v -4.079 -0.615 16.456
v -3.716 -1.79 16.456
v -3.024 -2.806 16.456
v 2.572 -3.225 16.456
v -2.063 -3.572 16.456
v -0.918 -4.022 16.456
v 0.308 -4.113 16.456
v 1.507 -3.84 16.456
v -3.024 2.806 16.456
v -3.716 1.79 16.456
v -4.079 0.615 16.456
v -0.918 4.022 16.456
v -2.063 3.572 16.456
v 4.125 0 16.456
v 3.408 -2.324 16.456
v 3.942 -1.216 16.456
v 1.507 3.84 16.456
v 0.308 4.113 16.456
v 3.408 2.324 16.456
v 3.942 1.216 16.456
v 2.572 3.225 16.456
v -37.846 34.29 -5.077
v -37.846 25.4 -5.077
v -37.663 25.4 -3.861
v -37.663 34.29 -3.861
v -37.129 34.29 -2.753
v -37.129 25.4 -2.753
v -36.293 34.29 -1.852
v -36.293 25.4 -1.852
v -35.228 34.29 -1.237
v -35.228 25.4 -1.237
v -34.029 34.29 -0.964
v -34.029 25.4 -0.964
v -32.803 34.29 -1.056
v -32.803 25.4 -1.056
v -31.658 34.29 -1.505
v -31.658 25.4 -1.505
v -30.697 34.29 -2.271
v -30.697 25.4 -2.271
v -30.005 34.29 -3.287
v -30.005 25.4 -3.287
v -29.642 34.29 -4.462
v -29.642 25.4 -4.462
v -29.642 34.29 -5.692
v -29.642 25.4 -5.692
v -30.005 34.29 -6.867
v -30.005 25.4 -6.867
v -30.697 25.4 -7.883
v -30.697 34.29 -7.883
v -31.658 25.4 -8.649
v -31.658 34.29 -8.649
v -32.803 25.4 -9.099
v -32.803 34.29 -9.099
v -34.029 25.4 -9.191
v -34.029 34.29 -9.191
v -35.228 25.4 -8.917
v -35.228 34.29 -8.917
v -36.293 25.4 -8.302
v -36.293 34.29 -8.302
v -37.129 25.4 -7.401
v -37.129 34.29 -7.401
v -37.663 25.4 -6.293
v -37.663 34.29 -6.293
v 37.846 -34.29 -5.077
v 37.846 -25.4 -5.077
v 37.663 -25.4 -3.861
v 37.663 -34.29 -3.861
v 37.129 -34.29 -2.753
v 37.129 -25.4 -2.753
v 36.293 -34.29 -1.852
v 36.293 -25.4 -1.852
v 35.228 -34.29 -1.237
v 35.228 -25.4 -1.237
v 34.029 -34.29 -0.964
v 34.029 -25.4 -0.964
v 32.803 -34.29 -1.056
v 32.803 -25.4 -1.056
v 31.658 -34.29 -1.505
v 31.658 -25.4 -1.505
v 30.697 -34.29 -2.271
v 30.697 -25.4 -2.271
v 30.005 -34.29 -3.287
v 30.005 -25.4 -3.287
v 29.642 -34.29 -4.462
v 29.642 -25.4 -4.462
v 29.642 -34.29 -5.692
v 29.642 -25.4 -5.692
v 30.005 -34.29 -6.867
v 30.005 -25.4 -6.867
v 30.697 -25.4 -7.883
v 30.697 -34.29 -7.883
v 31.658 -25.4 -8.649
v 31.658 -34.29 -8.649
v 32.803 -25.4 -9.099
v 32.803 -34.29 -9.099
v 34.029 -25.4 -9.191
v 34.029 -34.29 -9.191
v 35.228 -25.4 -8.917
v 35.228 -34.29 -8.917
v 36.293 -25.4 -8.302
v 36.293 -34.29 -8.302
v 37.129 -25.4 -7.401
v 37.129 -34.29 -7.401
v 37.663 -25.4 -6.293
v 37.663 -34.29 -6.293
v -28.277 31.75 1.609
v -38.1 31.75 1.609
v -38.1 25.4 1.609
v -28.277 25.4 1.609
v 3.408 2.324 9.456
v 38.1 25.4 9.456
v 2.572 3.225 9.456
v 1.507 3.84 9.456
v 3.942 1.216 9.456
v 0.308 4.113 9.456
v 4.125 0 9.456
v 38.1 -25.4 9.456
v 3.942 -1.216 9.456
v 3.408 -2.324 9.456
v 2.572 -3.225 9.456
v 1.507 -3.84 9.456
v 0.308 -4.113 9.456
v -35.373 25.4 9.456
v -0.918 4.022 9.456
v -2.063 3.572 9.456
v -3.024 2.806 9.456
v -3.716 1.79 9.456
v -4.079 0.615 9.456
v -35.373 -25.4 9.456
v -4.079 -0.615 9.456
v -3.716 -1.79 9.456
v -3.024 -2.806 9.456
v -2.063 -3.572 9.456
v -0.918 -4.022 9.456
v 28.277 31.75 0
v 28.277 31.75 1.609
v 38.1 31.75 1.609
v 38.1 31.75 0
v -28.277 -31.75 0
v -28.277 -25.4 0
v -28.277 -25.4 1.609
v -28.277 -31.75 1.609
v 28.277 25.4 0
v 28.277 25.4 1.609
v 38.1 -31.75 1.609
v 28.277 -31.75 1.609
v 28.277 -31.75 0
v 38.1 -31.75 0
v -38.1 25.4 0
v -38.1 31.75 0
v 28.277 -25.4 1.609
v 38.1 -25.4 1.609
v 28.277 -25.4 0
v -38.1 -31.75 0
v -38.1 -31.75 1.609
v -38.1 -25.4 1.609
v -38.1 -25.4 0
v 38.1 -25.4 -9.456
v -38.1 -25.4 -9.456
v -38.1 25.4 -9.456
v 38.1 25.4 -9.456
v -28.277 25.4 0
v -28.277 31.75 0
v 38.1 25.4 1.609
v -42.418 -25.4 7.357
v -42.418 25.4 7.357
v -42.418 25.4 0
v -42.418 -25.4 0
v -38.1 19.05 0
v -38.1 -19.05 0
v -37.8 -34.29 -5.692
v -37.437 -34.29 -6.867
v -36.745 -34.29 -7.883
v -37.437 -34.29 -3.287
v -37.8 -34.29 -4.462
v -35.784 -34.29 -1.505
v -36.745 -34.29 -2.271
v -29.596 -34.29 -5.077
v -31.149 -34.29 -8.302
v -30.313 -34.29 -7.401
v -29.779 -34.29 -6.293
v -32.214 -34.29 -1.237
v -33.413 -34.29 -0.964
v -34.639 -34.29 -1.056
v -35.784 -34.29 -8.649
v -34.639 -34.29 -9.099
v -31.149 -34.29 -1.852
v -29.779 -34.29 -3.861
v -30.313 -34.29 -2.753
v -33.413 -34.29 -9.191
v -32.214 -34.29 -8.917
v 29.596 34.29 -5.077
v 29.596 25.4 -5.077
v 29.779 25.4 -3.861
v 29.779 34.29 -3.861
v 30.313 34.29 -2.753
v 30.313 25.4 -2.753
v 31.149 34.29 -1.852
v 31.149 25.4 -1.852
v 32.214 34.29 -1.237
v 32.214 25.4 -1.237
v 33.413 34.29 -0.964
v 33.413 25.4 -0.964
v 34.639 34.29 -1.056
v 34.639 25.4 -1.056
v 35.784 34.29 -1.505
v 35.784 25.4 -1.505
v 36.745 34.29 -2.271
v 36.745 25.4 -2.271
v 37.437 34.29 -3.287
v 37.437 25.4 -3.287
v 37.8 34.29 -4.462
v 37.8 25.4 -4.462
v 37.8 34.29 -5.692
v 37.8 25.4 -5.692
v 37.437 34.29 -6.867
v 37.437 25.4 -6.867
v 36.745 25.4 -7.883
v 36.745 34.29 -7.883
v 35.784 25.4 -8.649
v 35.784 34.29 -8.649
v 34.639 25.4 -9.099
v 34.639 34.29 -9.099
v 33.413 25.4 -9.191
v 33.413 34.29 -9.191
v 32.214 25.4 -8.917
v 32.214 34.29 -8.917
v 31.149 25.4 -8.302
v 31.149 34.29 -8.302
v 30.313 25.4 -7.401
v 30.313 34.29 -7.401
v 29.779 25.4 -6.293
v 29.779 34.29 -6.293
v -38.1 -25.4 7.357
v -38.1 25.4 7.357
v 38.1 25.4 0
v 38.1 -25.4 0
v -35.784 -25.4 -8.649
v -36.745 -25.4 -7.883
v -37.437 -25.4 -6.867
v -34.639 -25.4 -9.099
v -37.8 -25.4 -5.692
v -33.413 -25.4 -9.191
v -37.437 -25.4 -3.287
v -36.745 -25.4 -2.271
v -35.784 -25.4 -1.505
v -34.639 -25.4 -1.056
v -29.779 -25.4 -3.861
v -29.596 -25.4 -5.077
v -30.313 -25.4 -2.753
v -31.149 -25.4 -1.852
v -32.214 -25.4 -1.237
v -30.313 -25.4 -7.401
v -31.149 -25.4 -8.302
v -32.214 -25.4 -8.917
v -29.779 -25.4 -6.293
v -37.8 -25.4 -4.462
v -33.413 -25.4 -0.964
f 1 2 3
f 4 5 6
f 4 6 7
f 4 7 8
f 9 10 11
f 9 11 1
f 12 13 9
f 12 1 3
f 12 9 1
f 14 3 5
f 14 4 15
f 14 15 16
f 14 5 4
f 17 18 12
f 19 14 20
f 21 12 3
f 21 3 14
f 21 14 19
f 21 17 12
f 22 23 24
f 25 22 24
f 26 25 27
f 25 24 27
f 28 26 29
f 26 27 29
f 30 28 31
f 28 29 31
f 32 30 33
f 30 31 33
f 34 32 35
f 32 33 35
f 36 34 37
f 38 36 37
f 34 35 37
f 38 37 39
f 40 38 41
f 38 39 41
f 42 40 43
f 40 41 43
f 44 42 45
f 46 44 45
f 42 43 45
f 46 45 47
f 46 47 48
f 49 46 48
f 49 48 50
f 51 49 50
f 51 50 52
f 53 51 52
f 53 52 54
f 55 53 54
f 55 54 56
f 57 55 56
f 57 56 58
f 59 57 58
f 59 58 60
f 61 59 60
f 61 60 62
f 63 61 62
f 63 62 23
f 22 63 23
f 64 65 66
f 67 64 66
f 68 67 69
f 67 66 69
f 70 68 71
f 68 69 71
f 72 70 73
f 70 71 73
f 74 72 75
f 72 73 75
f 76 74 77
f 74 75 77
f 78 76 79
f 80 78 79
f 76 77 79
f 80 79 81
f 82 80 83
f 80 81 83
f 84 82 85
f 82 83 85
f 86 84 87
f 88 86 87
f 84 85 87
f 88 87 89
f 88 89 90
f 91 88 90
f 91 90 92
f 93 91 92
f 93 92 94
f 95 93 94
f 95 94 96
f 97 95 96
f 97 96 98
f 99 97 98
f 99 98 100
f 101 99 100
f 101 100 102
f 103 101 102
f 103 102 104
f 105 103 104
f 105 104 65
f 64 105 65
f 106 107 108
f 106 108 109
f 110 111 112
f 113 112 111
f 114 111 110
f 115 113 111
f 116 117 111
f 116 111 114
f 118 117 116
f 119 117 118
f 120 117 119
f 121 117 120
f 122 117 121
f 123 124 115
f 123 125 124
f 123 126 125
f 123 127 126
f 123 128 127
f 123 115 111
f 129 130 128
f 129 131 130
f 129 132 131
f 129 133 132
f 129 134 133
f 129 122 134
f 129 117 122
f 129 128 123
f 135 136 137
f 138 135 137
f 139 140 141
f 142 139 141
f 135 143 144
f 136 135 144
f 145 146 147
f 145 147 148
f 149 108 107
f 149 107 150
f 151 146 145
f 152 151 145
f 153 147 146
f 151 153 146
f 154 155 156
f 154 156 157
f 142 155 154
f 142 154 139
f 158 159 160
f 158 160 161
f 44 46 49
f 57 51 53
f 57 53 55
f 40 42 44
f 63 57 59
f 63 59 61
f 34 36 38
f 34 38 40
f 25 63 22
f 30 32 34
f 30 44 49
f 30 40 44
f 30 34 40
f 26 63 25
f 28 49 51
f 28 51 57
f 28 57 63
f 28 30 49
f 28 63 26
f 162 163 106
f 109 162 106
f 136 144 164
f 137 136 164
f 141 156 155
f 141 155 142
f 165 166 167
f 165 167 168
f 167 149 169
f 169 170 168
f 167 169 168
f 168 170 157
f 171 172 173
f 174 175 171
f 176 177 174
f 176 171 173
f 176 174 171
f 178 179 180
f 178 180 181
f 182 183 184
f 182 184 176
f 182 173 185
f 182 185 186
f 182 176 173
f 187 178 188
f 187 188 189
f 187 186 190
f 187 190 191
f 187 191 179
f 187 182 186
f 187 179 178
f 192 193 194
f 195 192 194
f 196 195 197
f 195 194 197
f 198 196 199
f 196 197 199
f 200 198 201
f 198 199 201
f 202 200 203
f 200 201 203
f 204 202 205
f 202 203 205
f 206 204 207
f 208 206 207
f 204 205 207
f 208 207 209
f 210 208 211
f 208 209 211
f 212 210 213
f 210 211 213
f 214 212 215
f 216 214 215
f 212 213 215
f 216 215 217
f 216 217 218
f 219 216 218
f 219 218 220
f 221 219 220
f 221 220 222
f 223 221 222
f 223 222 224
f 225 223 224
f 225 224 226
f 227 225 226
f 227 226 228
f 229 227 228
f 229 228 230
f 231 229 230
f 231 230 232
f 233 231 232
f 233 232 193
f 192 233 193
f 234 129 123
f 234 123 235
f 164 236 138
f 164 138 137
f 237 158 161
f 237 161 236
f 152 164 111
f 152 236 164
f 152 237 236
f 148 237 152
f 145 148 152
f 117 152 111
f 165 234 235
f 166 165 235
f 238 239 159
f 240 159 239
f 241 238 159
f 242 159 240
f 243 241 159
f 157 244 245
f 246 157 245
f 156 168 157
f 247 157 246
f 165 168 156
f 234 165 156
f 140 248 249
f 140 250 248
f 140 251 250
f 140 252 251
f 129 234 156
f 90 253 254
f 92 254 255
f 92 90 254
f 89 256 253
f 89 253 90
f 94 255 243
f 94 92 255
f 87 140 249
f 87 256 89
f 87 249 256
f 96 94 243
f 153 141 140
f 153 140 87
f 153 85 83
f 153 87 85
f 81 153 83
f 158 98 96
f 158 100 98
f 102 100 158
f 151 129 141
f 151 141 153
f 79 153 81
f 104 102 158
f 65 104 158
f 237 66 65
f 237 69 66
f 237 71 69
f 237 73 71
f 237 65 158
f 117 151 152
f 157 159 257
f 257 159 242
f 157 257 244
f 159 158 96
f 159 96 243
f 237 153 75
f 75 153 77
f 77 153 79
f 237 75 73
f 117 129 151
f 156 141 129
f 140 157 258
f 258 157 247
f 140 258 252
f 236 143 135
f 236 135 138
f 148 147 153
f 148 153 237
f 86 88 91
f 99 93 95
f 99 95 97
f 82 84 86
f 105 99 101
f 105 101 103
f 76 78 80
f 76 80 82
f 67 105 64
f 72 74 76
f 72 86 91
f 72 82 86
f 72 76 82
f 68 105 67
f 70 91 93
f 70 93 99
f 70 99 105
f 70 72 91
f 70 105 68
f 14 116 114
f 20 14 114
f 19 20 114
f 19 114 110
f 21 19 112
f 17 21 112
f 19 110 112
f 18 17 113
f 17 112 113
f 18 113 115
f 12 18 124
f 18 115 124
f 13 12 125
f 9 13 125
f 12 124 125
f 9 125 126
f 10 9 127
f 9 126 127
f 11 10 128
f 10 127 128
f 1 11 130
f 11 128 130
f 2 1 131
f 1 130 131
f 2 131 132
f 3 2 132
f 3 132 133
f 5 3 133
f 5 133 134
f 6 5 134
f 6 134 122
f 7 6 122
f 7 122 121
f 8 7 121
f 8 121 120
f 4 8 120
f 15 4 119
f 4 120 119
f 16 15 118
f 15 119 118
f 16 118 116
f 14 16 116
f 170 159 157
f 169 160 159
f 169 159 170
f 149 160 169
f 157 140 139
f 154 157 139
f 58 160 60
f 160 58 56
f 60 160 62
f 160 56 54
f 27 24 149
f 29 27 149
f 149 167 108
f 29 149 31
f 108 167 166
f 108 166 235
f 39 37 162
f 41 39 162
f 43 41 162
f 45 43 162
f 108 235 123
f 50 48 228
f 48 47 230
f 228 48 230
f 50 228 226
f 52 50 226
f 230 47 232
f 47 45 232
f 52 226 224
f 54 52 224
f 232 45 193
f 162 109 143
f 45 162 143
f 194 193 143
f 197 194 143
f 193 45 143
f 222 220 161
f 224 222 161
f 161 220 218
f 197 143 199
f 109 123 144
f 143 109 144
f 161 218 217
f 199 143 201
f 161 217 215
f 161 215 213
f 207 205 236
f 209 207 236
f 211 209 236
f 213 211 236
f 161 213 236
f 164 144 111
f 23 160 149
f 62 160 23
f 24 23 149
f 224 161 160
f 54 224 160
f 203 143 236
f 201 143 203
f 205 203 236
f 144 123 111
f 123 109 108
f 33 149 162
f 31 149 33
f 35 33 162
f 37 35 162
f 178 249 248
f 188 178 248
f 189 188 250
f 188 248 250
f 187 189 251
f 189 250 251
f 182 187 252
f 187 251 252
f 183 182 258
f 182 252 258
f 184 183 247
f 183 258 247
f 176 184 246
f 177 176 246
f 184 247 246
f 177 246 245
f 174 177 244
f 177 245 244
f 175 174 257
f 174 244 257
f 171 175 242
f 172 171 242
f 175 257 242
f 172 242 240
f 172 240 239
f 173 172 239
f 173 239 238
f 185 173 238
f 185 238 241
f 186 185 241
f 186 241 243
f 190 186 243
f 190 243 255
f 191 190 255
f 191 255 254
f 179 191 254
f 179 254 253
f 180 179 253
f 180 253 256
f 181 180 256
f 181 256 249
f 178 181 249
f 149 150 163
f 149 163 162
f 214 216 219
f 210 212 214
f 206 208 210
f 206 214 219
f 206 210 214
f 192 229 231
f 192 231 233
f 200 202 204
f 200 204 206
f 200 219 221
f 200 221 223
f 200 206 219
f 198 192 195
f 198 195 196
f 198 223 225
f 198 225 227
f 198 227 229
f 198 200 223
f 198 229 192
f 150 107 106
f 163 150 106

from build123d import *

# Parameters (mm, degrees)
F1_DEPTH  = 25.4
F0_W      = 9.8233733336
F0_H      = 1.6087094842
F2_DEPTH  = 31.75
F0_H_2    = 9.4561445239
F3_DEPTH  = 19.05
F5_DEPTH  = 4.318
F8_R      = 4.125
F9_DEPTH  = 7
F11_R     = 4.125
F7_R      = 4.125
F12_DEPTH = 15.24
F6_R      = 4.125
F10_R     = 4.125
F13_DEPTH = 15.24
F14_DEPTH = 6.35
F15_DEPTH = 6.35


with BuildPart() as f1:
    # F0 (on Front) → F1 (new body, symmetric)
    with BuildSketch(Plane.XZ):
        Polygon((38.1, 9.4561445239), (-35.3728867915, 9.4561445239), (-38.1, 7.3570762504), (-38.1, 1.6087094842), (-28.2766266664, 1.6087094842), (-28.2766266664, 0), (-28.2766266664, -9.4561445239), (28.2766266664, -9.4561445239), (28.2766266664, 0), (28.2766266664, 1.6087094842), (38.1, 1.6087094842), align=None)
    extrude(amount=F1_DEPTH, both=True)

    # F0 (on Front) → F2 (join, symmetric)
    with BuildSketch(Plane.XZ):
        with Locations((-33.1883133332, 0.8043547421)):
            Rectangle(F0_W, F0_H)
        with Locations((33.1883133332, 0.8043547421)):
            Rectangle(F0_W, F0_H)
    extrude(amount=F2_DEPTH, both=True)

    # F0 (on Front) → F3 (join, symmetric)
    with BuildSketch(Plane.XZ):
        with Locations((-33.1883133332, -4.728072262)):
            Rectangle(F0_W, F0_H_2)
        with Locations((33.1883133332, -4.728072262)):
            Rectangle(F0_W, F0_H_2)
    extrude(amount=F3_DEPTH, both=True)

    # F4 (on face) → F5 (join)
    with BuildSketch(Plane(origin=(-38.1, 0, 0), x_dir=(0, -1, 0), z_dir=(-1, 0, 0))):
        Polygon((-19.05, 0), (19.05, 0), (25.4, 0), (25.4, 1.6087094842), (25.4, 7.3570762504), (-25.4, 7.3570762504), (-25.4, 1.6087094842), (-25.4, 0), align=None)
    extrude(amount=F5_DEPTH)

    # F8 (on face) → F9 (join)
    with BuildSketch(Plane.XY.offset(9.4561445239)):
        Circle(F8_R)
    extrude(amount=F9_DEPTH)

    # F11 (on face) + F7 (on face) → F12 (join)
    with BuildSketch(Plane(origin=(0, 19.05, 0), x_dir=(-1, 0, 0), z_dir=(0, 1, 0))):
        with Locations((-33.721, -5.0771445239)):
            Circle(F11_R)
    with BuildSketch(Plane(origin=(0, 19.05, 0), x_dir=(-1, 0, 0), z_dir=(0, 1, 0))):
        with Locations((33.721, -5.0771445239)):
            Circle(F7_R)
    extrude(amount=F12_DEPTH)

    # F6 (on face) + F10 (on face) → F13 (join)
    with BuildSketch(Plane.XZ.offset(19.05)):
        with Locations((-33.721, -5.0771445239)):
            Circle(F6_R)
    with BuildSketch(Plane.XZ.offset(19.05)):
        with Locations((33.721, -5.0771445239)):
            Circle(F10_R)
    extrude(amount=F13_DEPTH)

    # F14 (add): faces of the model
    f14_faces = [f1.faces().sort_by_distance(p)[0] for p in [
        (-33.1883133332, -19.05, -0.1363515064),
        (33.1883133332, -19.05, -9.3197930175),
    ]]
    extrude(f14_faces, amount=F14_DEPTH)

    # F15 (add): faces of the model
    f15_faces = [f1.faces().sort_by_distance(p)[0] for p in [
        (33.1883133332, 19.05, -9.3197930175),
        (-33.1883133332, 19.05, -0.1363515064),
    ]]
    extrude(f15_faces, amount=F15_DEPTH)


solid = f1.part
